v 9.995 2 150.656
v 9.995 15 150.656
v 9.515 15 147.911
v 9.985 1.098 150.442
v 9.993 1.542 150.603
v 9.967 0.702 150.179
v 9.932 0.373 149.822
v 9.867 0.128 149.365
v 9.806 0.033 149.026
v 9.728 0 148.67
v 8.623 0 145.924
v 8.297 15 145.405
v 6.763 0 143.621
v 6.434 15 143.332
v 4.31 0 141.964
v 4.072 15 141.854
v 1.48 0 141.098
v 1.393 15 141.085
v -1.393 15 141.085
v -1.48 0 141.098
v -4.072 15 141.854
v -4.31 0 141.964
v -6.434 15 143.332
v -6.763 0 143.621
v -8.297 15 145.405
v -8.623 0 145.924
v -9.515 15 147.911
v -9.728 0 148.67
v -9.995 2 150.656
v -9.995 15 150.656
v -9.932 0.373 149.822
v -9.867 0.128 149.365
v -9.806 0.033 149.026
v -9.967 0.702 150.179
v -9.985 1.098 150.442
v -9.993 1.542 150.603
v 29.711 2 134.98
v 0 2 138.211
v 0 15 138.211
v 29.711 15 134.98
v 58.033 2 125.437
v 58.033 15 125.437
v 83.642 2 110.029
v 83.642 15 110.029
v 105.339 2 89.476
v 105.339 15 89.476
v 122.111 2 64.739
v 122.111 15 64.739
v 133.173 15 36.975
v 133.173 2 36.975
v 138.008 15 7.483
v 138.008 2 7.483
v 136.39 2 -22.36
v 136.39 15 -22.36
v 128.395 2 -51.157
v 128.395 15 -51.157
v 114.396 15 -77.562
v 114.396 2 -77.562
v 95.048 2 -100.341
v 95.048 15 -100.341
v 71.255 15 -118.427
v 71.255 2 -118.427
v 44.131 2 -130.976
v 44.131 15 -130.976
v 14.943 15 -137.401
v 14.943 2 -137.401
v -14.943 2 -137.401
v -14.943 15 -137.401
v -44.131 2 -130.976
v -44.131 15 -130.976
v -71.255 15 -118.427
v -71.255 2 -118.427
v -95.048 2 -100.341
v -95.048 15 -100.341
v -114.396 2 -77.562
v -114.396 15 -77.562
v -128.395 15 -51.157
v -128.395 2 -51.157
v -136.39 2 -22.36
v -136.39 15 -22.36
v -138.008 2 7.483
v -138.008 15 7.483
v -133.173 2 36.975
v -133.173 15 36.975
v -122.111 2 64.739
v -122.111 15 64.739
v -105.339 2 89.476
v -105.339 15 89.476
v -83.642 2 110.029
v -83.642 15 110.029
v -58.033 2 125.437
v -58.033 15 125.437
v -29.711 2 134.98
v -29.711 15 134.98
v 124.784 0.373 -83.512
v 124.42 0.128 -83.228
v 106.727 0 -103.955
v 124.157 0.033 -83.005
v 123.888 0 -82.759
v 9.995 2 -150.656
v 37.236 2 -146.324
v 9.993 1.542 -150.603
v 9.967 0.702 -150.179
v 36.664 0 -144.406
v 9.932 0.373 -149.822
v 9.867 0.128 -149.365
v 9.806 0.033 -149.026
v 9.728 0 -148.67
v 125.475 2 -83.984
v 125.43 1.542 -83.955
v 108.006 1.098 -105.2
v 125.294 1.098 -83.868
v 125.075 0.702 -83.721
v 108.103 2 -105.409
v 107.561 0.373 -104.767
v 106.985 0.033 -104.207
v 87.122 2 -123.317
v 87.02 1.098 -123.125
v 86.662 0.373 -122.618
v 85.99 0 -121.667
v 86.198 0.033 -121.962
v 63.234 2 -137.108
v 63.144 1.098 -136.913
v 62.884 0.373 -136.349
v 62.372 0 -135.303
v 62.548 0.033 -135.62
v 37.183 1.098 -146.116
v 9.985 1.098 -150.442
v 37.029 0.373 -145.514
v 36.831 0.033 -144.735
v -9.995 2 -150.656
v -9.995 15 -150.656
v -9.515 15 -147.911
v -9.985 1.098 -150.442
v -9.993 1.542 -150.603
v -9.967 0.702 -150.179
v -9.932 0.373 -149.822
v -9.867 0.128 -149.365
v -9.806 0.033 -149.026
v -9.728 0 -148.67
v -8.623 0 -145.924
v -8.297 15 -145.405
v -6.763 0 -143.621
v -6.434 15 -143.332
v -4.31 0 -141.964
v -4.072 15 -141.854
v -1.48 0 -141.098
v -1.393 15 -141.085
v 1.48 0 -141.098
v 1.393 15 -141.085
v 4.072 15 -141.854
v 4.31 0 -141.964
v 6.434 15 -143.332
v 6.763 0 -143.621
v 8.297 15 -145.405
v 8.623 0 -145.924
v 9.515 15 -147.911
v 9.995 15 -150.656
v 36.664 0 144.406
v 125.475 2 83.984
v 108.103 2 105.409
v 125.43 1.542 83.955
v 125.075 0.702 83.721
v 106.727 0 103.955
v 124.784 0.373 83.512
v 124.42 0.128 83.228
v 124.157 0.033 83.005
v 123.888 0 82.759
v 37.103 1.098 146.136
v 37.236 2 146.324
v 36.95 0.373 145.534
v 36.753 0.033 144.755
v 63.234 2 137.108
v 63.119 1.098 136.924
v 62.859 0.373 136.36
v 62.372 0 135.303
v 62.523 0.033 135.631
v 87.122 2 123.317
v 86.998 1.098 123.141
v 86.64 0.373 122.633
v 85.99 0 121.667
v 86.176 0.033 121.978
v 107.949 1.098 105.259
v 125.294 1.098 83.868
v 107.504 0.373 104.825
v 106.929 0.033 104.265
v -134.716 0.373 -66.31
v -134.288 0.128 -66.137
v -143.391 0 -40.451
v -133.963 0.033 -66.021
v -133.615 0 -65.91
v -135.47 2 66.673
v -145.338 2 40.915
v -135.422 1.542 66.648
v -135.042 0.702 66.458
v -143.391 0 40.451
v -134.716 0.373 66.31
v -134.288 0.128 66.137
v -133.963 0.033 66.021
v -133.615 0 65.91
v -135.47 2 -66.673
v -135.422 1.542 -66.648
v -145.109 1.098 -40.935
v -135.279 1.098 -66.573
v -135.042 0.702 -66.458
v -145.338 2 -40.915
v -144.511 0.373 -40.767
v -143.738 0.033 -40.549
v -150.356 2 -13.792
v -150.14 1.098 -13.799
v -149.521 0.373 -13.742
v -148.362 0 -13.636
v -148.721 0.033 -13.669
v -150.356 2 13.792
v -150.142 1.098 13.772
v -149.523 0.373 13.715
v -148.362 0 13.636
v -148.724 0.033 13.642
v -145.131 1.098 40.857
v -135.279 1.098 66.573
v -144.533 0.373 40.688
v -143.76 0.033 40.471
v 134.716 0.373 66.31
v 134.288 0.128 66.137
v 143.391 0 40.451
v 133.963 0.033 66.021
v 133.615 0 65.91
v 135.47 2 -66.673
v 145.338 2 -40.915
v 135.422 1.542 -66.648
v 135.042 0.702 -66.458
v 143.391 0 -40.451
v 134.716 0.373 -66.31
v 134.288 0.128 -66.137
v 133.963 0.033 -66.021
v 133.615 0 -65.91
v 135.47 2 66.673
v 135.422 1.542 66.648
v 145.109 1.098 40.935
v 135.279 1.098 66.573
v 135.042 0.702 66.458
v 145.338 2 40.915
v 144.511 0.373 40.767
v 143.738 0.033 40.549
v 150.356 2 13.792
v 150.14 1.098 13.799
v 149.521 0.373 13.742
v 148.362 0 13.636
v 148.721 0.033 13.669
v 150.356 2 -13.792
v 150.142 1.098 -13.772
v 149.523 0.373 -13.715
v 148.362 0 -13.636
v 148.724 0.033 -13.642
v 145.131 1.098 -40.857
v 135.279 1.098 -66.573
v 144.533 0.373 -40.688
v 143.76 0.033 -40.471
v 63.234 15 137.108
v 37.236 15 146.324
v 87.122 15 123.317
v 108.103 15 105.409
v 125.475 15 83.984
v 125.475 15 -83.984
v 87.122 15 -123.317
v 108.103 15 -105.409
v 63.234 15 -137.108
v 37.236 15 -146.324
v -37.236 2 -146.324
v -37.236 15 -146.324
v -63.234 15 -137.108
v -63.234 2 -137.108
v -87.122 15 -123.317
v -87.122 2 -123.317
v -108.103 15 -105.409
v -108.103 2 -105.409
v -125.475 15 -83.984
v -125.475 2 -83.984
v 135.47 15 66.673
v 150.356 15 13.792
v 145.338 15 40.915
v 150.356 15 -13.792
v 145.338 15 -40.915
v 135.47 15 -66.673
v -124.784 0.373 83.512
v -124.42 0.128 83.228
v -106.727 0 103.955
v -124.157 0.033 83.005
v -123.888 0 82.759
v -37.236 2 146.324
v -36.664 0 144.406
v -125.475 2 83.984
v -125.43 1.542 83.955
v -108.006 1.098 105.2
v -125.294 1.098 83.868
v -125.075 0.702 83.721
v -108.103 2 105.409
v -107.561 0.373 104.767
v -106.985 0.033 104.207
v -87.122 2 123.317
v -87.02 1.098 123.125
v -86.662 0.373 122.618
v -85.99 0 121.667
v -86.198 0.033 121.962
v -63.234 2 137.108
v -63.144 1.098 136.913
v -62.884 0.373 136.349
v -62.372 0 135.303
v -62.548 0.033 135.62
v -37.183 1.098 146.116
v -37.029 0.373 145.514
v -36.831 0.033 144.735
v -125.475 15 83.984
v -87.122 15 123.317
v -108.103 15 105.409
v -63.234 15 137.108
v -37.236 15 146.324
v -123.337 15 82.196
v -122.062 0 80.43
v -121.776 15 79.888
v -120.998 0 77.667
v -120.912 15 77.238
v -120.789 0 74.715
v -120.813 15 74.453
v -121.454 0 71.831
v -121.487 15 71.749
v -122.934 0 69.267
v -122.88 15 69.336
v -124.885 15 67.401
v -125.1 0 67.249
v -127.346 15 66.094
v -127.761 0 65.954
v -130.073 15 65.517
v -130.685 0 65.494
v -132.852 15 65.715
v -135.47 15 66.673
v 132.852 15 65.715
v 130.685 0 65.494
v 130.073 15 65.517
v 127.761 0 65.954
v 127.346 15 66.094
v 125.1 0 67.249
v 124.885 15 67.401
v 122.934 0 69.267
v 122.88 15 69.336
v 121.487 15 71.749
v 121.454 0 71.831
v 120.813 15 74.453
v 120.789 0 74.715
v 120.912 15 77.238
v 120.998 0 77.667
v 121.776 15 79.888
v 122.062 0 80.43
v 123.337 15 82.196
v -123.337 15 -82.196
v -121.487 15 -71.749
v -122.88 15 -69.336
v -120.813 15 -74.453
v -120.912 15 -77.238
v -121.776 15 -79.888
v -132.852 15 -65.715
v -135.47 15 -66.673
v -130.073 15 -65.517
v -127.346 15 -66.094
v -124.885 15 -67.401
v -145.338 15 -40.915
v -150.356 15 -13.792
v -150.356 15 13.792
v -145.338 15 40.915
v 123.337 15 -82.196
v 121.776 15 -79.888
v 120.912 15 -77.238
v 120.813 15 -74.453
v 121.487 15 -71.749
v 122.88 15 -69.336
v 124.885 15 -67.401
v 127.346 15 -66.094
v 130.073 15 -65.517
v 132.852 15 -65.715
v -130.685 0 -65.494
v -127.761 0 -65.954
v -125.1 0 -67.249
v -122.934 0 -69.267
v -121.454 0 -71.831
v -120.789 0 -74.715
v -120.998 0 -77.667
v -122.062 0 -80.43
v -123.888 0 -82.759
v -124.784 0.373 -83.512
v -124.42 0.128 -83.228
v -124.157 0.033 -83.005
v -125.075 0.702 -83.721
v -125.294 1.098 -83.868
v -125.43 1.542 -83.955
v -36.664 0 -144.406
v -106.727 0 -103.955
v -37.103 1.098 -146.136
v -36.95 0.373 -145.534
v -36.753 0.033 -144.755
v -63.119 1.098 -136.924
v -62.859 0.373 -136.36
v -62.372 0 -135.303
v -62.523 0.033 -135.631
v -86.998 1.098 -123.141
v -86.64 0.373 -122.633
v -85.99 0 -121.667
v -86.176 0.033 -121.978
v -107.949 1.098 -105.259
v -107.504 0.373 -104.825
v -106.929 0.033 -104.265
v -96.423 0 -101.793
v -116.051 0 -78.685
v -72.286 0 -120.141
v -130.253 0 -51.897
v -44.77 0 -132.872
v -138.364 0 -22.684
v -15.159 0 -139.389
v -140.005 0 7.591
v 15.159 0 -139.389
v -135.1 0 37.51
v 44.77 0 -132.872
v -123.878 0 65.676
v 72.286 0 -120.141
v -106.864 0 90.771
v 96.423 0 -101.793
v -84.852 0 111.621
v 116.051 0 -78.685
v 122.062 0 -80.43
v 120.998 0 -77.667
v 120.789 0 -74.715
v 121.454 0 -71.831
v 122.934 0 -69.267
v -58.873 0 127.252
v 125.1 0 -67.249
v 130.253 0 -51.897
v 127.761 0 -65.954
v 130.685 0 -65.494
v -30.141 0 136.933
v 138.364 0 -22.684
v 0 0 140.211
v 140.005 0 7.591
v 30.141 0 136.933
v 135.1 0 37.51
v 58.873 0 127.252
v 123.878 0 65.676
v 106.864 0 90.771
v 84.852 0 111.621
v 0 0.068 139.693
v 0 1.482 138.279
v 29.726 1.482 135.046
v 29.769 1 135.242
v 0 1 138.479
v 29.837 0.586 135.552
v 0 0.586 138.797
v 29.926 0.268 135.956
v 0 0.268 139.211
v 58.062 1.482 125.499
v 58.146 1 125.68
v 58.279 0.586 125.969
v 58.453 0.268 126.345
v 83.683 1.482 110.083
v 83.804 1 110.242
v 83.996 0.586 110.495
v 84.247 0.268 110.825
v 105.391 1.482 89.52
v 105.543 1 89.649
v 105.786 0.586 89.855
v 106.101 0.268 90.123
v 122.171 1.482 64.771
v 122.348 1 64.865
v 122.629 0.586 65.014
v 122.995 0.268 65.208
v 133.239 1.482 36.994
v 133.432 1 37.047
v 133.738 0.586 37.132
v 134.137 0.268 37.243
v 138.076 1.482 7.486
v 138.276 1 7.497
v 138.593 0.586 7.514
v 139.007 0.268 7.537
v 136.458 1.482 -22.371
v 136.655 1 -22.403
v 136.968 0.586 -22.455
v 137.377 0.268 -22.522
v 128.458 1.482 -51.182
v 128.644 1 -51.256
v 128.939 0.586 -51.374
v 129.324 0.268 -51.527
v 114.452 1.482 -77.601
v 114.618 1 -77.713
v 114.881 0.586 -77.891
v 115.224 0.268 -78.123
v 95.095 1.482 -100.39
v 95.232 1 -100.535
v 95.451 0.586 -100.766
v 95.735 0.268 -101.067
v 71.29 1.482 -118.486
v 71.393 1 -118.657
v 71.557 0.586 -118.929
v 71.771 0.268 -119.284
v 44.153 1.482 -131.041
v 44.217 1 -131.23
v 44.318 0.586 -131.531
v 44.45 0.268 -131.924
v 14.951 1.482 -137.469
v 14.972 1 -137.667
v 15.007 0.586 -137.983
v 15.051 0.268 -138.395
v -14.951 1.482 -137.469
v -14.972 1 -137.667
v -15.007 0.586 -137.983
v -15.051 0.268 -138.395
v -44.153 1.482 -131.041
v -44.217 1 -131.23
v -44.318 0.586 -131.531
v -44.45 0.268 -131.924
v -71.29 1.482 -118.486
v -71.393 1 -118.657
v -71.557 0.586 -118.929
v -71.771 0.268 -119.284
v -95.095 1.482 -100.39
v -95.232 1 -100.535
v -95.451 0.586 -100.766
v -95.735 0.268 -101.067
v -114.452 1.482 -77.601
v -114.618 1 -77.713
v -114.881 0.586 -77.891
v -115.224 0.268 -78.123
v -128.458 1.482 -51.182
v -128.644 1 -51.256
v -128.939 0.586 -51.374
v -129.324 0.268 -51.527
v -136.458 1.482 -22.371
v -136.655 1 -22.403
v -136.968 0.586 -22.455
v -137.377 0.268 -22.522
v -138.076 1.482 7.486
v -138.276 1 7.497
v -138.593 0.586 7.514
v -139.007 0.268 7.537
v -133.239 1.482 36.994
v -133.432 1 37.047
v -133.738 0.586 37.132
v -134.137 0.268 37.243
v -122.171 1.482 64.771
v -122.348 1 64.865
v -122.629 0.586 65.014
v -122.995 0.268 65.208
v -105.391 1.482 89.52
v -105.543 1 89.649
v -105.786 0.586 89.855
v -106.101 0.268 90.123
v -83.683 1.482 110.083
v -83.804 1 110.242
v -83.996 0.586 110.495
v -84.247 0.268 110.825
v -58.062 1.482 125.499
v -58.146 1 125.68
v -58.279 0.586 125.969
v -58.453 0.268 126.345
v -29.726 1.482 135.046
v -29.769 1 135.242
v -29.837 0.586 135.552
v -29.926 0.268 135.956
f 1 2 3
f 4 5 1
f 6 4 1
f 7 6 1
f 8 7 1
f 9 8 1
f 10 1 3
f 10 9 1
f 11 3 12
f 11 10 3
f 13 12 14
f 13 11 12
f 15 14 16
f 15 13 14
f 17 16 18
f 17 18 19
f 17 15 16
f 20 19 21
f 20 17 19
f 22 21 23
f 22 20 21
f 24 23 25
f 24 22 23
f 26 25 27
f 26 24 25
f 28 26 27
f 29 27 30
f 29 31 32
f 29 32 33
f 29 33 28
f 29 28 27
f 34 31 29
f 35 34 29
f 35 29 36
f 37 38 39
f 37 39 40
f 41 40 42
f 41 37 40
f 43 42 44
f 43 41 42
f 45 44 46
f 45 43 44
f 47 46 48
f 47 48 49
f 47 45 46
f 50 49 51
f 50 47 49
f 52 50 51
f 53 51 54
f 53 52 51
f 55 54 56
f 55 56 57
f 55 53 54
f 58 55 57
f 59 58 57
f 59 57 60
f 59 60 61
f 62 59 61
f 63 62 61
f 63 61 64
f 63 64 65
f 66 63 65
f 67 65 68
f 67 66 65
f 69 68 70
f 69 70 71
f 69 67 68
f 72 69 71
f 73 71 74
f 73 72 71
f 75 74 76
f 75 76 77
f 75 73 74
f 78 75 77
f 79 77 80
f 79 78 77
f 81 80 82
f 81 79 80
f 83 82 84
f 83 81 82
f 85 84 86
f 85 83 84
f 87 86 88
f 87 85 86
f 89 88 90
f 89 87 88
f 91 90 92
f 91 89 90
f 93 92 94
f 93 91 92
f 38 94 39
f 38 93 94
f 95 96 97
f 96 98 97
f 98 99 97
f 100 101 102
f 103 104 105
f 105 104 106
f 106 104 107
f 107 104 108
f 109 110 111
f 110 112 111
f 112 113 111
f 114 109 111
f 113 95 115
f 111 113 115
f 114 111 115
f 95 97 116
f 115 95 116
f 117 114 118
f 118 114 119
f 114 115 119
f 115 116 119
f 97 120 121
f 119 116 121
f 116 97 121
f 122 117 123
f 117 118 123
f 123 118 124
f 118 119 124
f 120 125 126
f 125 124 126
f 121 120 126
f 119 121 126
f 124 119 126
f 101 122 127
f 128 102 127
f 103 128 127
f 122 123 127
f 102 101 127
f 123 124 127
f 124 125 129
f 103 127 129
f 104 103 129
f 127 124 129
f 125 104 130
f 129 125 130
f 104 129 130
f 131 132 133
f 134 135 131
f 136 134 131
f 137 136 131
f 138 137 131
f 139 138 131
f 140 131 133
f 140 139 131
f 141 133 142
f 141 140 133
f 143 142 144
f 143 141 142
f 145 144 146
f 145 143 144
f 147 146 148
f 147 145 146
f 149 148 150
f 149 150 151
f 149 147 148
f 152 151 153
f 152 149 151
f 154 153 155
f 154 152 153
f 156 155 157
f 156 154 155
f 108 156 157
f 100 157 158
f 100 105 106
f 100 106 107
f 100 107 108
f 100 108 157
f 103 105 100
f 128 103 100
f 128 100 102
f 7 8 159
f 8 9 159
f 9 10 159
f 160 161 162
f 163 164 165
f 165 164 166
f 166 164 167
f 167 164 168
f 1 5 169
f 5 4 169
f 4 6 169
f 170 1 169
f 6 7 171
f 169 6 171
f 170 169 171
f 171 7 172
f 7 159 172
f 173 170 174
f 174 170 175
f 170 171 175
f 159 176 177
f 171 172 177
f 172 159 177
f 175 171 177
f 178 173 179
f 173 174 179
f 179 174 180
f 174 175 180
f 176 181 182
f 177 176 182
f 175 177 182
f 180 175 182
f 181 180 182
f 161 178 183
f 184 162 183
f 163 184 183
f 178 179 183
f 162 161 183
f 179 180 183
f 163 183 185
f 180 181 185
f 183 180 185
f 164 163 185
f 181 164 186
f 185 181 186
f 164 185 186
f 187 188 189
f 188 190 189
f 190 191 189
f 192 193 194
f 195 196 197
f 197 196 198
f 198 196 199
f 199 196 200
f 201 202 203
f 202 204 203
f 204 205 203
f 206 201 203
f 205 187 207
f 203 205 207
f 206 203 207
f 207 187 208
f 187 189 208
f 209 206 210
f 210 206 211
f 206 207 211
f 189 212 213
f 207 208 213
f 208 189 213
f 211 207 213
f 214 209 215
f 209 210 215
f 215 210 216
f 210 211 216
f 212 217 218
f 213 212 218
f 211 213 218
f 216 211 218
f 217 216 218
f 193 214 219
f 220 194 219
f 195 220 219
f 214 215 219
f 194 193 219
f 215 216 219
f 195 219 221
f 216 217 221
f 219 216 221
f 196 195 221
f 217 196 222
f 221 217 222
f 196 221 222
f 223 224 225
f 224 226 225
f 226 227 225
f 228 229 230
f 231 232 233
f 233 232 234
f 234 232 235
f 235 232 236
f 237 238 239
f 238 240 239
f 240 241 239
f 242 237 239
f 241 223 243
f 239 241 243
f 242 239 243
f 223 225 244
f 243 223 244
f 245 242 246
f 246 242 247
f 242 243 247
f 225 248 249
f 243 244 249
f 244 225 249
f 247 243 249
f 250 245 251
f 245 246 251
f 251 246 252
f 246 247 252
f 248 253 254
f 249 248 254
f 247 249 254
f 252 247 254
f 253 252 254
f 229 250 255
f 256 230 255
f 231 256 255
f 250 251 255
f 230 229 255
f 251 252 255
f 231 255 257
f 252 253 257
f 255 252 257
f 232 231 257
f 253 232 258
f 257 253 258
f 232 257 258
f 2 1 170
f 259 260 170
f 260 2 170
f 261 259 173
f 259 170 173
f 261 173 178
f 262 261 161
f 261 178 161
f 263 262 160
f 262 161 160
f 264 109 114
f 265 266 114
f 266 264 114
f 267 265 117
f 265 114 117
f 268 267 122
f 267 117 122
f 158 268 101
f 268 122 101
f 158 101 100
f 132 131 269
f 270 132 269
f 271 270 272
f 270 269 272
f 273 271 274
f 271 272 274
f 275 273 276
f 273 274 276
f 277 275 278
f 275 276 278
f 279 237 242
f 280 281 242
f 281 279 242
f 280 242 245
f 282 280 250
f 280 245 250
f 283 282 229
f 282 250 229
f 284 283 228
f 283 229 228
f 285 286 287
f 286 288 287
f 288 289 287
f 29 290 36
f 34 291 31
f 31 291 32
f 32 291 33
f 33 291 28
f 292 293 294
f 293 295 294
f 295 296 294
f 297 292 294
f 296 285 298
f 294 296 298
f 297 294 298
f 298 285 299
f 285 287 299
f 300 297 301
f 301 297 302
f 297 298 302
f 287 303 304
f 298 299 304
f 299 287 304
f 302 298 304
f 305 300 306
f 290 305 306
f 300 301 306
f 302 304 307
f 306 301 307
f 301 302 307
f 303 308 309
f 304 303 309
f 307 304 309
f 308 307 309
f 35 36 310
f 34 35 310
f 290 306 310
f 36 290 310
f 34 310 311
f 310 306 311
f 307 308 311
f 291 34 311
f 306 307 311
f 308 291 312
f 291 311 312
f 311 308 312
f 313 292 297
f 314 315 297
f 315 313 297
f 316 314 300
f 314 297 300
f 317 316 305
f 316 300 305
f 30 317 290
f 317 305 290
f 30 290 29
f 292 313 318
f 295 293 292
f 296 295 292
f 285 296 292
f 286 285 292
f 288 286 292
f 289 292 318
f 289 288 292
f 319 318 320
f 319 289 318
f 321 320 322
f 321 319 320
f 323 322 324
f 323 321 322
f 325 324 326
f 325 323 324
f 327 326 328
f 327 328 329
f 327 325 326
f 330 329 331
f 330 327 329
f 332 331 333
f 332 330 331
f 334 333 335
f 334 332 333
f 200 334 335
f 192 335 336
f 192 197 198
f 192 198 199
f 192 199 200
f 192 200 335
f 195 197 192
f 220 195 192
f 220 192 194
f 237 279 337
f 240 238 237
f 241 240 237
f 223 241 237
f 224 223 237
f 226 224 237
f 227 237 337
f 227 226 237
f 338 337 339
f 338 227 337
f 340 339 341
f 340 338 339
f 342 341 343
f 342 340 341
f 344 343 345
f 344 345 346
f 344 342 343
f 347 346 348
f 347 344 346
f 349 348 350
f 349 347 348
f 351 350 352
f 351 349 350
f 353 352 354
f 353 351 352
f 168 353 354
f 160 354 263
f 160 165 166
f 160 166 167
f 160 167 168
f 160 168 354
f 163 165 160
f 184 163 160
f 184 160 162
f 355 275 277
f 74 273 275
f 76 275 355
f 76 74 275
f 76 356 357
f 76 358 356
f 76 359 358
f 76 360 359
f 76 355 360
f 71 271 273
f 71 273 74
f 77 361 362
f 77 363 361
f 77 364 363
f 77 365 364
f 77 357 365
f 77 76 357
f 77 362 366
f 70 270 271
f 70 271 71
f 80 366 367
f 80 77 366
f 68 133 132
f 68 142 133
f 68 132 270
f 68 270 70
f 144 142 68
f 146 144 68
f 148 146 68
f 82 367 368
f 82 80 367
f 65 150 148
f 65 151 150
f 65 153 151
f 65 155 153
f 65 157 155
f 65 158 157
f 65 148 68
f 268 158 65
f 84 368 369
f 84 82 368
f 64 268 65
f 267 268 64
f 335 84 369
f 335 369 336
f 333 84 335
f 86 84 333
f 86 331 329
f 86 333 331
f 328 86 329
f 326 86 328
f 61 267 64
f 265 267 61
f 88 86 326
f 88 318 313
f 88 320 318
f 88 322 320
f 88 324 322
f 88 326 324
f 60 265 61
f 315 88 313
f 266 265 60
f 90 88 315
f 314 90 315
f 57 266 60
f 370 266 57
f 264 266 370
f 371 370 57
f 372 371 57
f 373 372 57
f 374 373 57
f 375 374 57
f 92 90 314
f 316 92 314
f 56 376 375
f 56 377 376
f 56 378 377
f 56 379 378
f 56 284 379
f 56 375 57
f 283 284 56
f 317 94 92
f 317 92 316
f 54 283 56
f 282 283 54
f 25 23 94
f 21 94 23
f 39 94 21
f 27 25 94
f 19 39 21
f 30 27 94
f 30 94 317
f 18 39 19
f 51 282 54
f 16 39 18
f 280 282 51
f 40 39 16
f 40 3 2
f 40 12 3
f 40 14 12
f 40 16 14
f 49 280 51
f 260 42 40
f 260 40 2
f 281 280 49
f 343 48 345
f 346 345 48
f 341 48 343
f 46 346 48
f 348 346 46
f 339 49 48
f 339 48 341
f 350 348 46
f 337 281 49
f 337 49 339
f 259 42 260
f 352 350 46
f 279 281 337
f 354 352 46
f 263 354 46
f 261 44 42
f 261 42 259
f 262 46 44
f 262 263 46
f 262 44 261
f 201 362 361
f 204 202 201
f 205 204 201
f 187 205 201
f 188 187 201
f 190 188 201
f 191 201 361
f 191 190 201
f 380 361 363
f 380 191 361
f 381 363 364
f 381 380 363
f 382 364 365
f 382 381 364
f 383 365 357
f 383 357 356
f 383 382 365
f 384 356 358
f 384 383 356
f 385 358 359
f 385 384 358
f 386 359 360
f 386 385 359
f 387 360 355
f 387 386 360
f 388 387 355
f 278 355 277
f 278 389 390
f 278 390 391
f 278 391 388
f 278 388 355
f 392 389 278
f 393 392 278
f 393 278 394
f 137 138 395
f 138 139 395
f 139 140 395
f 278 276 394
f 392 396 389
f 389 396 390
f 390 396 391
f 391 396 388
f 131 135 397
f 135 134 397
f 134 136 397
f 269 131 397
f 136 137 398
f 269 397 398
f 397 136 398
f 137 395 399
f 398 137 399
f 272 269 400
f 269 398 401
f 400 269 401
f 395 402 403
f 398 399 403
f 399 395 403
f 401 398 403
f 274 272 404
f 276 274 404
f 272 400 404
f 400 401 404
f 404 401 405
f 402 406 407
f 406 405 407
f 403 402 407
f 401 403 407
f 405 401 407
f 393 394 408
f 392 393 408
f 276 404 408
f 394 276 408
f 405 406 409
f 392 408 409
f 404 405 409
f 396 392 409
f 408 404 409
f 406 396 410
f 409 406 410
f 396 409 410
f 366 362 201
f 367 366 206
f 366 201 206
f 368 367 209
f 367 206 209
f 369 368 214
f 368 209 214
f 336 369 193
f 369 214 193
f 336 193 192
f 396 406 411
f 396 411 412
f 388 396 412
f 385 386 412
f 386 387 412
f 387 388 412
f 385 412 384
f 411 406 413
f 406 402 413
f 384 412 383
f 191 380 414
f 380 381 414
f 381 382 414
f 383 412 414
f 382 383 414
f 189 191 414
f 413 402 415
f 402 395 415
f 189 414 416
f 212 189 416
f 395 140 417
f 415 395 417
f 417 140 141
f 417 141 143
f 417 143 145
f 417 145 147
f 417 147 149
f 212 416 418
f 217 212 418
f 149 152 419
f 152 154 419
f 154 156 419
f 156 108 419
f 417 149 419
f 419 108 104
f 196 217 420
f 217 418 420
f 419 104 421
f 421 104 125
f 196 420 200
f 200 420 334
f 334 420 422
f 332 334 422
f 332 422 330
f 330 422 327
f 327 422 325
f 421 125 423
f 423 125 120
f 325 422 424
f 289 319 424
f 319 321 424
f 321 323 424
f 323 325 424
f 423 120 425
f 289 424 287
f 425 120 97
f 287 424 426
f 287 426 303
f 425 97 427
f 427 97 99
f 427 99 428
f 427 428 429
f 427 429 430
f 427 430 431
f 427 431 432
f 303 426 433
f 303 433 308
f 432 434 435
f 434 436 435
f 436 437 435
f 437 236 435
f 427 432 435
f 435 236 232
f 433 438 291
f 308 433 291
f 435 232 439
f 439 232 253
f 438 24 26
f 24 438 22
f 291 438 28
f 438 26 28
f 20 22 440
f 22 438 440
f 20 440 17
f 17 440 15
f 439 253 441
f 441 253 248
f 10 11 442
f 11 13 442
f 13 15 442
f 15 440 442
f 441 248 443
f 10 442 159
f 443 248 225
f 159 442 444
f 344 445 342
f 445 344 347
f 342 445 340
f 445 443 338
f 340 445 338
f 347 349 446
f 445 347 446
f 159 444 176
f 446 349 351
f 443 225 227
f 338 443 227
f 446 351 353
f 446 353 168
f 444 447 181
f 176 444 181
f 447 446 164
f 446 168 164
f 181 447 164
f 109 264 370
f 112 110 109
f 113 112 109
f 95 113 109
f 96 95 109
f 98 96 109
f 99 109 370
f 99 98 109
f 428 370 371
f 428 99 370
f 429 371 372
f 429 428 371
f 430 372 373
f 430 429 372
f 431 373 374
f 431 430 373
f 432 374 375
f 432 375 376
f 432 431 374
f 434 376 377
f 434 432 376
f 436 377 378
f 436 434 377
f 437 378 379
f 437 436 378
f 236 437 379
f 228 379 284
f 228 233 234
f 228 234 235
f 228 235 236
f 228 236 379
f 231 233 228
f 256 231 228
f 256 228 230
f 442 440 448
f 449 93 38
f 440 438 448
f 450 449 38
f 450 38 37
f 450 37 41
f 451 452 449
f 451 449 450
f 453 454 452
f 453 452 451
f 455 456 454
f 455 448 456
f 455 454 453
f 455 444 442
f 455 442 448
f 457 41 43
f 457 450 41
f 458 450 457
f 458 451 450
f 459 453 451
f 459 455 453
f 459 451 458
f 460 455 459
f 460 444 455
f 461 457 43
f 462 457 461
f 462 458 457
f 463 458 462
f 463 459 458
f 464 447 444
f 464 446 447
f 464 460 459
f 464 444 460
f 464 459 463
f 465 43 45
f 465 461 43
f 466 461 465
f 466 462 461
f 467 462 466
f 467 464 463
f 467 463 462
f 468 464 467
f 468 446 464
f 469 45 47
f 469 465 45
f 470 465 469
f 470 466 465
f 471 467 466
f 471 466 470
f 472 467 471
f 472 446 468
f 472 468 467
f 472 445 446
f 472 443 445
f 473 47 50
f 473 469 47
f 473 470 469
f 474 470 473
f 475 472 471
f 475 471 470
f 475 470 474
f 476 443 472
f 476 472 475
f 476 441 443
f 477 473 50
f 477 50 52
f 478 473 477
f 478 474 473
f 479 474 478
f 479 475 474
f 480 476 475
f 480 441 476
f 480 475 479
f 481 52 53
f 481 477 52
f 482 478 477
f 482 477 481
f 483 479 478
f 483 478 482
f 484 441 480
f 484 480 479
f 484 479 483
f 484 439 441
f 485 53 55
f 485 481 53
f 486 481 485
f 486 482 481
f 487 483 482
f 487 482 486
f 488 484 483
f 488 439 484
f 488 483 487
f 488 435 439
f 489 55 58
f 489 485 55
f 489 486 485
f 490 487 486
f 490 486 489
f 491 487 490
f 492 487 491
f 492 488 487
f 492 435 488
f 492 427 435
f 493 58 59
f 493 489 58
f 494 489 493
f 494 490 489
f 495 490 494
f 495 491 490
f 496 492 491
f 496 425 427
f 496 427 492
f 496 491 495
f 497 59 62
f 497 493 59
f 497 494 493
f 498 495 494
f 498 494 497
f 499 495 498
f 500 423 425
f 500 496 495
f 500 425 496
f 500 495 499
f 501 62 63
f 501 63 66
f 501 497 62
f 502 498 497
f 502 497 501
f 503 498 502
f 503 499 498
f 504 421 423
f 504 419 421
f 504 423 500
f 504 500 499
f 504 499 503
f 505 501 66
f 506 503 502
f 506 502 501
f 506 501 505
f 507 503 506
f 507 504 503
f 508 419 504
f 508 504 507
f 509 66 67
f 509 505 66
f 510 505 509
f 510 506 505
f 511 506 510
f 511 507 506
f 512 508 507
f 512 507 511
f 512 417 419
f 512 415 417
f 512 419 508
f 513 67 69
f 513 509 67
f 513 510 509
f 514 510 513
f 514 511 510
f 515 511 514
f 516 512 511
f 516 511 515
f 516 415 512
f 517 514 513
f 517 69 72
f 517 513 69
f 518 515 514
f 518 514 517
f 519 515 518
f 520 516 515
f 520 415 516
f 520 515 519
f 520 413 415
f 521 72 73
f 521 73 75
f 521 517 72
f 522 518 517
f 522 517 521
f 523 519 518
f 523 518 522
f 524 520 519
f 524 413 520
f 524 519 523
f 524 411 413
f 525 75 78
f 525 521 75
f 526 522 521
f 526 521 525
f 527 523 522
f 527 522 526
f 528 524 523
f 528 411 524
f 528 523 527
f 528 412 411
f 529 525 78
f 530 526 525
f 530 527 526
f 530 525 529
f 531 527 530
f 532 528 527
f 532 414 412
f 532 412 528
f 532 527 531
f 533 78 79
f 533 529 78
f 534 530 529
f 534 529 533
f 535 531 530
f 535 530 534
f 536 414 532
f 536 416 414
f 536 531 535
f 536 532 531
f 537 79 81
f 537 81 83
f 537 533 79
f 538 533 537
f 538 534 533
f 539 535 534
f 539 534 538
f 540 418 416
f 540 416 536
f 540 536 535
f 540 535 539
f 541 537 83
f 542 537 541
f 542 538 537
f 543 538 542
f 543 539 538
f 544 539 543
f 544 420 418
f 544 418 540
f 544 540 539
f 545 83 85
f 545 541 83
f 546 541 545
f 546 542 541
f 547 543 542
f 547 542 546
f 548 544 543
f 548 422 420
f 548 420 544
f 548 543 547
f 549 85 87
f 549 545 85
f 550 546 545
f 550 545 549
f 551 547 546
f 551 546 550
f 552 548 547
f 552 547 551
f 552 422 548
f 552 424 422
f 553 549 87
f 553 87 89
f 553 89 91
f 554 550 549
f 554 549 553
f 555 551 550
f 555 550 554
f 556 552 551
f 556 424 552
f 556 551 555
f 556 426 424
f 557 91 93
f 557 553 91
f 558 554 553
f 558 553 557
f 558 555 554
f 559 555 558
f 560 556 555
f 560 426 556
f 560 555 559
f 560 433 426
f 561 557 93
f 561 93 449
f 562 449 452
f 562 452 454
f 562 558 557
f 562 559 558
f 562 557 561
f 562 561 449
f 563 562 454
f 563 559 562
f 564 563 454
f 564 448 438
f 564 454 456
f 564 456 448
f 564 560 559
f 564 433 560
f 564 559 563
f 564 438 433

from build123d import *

# Parameters (mm, degrees)
SKETCH_1_R               = 150.987526818
SKETCH_1_R_2             = 138.21111966
EXTRUDE_1_DEPTH          = 15
FILLET_1_R               = 2
SKETCH_2_R               = 10
CUT_EXTRUDE_1_DEPTH      = 15
PATTERN_CIRCULAR_1_COUNT = 6


with BuildPart() as part:
    # Эскиз1 → Бобышка-Вытянуть1 (new body)
    with BuildSketch(Plane(origin=(0, 0, 0), x_dir=(1, 0, 0), z_dir=(0, 1, 0))):
        with Locations(Location((0, 0, 0), (0, 0, 270))):
            Circle(SKETCH_1_R)
        with Locations(Location((0, 0, 0), (0, 0, 270))):
            Circle(SKETCH_1_R_2, mode=Mode.SUBTRACT)
    extrude(amount=EXTRUDE_1_DEPTH)

    # Скругление1
    fillet_1_edges = [part.edges().sort_by_distance(p)[0] for p in [
        (0, 0, -150.987526818),
        (0, 0, -138.21111966),
    ]]
    fillet(fillet_1_edges, radius=FILLET_1_R)

    # Эскиз2 → Вырез-Вытянуть1 (cut)
    with BuildSketch(Plane(origin=(0, 0, 0), x_dir=(1, 0, 0), z_dir=(0, 1, 0))):
        with Locations((0, 150.987526818)):
            Circle(SKETCH_2_R)
    cut_extrude_1 = extrude(amount=CUT_EXTRUDE_1_DEPTH, mode=Mode.SUBTRACT)

    # Круговой массив1: Вырез-Вытянуть1 ×6 about axis
    pattern_circular_1_axis = Axis((0, 0, 0), (0, 1, 0))
    for i in range(1, PATTERN_CIRCULAR_1_COUNT):
        add(cut_extrude_1.rotate(pattern_circular_1_axis, i * 360 / PATTERN_CIRCULAR_1_COUNT), mode=Mode.SUBTRACT)


solid = part.part
